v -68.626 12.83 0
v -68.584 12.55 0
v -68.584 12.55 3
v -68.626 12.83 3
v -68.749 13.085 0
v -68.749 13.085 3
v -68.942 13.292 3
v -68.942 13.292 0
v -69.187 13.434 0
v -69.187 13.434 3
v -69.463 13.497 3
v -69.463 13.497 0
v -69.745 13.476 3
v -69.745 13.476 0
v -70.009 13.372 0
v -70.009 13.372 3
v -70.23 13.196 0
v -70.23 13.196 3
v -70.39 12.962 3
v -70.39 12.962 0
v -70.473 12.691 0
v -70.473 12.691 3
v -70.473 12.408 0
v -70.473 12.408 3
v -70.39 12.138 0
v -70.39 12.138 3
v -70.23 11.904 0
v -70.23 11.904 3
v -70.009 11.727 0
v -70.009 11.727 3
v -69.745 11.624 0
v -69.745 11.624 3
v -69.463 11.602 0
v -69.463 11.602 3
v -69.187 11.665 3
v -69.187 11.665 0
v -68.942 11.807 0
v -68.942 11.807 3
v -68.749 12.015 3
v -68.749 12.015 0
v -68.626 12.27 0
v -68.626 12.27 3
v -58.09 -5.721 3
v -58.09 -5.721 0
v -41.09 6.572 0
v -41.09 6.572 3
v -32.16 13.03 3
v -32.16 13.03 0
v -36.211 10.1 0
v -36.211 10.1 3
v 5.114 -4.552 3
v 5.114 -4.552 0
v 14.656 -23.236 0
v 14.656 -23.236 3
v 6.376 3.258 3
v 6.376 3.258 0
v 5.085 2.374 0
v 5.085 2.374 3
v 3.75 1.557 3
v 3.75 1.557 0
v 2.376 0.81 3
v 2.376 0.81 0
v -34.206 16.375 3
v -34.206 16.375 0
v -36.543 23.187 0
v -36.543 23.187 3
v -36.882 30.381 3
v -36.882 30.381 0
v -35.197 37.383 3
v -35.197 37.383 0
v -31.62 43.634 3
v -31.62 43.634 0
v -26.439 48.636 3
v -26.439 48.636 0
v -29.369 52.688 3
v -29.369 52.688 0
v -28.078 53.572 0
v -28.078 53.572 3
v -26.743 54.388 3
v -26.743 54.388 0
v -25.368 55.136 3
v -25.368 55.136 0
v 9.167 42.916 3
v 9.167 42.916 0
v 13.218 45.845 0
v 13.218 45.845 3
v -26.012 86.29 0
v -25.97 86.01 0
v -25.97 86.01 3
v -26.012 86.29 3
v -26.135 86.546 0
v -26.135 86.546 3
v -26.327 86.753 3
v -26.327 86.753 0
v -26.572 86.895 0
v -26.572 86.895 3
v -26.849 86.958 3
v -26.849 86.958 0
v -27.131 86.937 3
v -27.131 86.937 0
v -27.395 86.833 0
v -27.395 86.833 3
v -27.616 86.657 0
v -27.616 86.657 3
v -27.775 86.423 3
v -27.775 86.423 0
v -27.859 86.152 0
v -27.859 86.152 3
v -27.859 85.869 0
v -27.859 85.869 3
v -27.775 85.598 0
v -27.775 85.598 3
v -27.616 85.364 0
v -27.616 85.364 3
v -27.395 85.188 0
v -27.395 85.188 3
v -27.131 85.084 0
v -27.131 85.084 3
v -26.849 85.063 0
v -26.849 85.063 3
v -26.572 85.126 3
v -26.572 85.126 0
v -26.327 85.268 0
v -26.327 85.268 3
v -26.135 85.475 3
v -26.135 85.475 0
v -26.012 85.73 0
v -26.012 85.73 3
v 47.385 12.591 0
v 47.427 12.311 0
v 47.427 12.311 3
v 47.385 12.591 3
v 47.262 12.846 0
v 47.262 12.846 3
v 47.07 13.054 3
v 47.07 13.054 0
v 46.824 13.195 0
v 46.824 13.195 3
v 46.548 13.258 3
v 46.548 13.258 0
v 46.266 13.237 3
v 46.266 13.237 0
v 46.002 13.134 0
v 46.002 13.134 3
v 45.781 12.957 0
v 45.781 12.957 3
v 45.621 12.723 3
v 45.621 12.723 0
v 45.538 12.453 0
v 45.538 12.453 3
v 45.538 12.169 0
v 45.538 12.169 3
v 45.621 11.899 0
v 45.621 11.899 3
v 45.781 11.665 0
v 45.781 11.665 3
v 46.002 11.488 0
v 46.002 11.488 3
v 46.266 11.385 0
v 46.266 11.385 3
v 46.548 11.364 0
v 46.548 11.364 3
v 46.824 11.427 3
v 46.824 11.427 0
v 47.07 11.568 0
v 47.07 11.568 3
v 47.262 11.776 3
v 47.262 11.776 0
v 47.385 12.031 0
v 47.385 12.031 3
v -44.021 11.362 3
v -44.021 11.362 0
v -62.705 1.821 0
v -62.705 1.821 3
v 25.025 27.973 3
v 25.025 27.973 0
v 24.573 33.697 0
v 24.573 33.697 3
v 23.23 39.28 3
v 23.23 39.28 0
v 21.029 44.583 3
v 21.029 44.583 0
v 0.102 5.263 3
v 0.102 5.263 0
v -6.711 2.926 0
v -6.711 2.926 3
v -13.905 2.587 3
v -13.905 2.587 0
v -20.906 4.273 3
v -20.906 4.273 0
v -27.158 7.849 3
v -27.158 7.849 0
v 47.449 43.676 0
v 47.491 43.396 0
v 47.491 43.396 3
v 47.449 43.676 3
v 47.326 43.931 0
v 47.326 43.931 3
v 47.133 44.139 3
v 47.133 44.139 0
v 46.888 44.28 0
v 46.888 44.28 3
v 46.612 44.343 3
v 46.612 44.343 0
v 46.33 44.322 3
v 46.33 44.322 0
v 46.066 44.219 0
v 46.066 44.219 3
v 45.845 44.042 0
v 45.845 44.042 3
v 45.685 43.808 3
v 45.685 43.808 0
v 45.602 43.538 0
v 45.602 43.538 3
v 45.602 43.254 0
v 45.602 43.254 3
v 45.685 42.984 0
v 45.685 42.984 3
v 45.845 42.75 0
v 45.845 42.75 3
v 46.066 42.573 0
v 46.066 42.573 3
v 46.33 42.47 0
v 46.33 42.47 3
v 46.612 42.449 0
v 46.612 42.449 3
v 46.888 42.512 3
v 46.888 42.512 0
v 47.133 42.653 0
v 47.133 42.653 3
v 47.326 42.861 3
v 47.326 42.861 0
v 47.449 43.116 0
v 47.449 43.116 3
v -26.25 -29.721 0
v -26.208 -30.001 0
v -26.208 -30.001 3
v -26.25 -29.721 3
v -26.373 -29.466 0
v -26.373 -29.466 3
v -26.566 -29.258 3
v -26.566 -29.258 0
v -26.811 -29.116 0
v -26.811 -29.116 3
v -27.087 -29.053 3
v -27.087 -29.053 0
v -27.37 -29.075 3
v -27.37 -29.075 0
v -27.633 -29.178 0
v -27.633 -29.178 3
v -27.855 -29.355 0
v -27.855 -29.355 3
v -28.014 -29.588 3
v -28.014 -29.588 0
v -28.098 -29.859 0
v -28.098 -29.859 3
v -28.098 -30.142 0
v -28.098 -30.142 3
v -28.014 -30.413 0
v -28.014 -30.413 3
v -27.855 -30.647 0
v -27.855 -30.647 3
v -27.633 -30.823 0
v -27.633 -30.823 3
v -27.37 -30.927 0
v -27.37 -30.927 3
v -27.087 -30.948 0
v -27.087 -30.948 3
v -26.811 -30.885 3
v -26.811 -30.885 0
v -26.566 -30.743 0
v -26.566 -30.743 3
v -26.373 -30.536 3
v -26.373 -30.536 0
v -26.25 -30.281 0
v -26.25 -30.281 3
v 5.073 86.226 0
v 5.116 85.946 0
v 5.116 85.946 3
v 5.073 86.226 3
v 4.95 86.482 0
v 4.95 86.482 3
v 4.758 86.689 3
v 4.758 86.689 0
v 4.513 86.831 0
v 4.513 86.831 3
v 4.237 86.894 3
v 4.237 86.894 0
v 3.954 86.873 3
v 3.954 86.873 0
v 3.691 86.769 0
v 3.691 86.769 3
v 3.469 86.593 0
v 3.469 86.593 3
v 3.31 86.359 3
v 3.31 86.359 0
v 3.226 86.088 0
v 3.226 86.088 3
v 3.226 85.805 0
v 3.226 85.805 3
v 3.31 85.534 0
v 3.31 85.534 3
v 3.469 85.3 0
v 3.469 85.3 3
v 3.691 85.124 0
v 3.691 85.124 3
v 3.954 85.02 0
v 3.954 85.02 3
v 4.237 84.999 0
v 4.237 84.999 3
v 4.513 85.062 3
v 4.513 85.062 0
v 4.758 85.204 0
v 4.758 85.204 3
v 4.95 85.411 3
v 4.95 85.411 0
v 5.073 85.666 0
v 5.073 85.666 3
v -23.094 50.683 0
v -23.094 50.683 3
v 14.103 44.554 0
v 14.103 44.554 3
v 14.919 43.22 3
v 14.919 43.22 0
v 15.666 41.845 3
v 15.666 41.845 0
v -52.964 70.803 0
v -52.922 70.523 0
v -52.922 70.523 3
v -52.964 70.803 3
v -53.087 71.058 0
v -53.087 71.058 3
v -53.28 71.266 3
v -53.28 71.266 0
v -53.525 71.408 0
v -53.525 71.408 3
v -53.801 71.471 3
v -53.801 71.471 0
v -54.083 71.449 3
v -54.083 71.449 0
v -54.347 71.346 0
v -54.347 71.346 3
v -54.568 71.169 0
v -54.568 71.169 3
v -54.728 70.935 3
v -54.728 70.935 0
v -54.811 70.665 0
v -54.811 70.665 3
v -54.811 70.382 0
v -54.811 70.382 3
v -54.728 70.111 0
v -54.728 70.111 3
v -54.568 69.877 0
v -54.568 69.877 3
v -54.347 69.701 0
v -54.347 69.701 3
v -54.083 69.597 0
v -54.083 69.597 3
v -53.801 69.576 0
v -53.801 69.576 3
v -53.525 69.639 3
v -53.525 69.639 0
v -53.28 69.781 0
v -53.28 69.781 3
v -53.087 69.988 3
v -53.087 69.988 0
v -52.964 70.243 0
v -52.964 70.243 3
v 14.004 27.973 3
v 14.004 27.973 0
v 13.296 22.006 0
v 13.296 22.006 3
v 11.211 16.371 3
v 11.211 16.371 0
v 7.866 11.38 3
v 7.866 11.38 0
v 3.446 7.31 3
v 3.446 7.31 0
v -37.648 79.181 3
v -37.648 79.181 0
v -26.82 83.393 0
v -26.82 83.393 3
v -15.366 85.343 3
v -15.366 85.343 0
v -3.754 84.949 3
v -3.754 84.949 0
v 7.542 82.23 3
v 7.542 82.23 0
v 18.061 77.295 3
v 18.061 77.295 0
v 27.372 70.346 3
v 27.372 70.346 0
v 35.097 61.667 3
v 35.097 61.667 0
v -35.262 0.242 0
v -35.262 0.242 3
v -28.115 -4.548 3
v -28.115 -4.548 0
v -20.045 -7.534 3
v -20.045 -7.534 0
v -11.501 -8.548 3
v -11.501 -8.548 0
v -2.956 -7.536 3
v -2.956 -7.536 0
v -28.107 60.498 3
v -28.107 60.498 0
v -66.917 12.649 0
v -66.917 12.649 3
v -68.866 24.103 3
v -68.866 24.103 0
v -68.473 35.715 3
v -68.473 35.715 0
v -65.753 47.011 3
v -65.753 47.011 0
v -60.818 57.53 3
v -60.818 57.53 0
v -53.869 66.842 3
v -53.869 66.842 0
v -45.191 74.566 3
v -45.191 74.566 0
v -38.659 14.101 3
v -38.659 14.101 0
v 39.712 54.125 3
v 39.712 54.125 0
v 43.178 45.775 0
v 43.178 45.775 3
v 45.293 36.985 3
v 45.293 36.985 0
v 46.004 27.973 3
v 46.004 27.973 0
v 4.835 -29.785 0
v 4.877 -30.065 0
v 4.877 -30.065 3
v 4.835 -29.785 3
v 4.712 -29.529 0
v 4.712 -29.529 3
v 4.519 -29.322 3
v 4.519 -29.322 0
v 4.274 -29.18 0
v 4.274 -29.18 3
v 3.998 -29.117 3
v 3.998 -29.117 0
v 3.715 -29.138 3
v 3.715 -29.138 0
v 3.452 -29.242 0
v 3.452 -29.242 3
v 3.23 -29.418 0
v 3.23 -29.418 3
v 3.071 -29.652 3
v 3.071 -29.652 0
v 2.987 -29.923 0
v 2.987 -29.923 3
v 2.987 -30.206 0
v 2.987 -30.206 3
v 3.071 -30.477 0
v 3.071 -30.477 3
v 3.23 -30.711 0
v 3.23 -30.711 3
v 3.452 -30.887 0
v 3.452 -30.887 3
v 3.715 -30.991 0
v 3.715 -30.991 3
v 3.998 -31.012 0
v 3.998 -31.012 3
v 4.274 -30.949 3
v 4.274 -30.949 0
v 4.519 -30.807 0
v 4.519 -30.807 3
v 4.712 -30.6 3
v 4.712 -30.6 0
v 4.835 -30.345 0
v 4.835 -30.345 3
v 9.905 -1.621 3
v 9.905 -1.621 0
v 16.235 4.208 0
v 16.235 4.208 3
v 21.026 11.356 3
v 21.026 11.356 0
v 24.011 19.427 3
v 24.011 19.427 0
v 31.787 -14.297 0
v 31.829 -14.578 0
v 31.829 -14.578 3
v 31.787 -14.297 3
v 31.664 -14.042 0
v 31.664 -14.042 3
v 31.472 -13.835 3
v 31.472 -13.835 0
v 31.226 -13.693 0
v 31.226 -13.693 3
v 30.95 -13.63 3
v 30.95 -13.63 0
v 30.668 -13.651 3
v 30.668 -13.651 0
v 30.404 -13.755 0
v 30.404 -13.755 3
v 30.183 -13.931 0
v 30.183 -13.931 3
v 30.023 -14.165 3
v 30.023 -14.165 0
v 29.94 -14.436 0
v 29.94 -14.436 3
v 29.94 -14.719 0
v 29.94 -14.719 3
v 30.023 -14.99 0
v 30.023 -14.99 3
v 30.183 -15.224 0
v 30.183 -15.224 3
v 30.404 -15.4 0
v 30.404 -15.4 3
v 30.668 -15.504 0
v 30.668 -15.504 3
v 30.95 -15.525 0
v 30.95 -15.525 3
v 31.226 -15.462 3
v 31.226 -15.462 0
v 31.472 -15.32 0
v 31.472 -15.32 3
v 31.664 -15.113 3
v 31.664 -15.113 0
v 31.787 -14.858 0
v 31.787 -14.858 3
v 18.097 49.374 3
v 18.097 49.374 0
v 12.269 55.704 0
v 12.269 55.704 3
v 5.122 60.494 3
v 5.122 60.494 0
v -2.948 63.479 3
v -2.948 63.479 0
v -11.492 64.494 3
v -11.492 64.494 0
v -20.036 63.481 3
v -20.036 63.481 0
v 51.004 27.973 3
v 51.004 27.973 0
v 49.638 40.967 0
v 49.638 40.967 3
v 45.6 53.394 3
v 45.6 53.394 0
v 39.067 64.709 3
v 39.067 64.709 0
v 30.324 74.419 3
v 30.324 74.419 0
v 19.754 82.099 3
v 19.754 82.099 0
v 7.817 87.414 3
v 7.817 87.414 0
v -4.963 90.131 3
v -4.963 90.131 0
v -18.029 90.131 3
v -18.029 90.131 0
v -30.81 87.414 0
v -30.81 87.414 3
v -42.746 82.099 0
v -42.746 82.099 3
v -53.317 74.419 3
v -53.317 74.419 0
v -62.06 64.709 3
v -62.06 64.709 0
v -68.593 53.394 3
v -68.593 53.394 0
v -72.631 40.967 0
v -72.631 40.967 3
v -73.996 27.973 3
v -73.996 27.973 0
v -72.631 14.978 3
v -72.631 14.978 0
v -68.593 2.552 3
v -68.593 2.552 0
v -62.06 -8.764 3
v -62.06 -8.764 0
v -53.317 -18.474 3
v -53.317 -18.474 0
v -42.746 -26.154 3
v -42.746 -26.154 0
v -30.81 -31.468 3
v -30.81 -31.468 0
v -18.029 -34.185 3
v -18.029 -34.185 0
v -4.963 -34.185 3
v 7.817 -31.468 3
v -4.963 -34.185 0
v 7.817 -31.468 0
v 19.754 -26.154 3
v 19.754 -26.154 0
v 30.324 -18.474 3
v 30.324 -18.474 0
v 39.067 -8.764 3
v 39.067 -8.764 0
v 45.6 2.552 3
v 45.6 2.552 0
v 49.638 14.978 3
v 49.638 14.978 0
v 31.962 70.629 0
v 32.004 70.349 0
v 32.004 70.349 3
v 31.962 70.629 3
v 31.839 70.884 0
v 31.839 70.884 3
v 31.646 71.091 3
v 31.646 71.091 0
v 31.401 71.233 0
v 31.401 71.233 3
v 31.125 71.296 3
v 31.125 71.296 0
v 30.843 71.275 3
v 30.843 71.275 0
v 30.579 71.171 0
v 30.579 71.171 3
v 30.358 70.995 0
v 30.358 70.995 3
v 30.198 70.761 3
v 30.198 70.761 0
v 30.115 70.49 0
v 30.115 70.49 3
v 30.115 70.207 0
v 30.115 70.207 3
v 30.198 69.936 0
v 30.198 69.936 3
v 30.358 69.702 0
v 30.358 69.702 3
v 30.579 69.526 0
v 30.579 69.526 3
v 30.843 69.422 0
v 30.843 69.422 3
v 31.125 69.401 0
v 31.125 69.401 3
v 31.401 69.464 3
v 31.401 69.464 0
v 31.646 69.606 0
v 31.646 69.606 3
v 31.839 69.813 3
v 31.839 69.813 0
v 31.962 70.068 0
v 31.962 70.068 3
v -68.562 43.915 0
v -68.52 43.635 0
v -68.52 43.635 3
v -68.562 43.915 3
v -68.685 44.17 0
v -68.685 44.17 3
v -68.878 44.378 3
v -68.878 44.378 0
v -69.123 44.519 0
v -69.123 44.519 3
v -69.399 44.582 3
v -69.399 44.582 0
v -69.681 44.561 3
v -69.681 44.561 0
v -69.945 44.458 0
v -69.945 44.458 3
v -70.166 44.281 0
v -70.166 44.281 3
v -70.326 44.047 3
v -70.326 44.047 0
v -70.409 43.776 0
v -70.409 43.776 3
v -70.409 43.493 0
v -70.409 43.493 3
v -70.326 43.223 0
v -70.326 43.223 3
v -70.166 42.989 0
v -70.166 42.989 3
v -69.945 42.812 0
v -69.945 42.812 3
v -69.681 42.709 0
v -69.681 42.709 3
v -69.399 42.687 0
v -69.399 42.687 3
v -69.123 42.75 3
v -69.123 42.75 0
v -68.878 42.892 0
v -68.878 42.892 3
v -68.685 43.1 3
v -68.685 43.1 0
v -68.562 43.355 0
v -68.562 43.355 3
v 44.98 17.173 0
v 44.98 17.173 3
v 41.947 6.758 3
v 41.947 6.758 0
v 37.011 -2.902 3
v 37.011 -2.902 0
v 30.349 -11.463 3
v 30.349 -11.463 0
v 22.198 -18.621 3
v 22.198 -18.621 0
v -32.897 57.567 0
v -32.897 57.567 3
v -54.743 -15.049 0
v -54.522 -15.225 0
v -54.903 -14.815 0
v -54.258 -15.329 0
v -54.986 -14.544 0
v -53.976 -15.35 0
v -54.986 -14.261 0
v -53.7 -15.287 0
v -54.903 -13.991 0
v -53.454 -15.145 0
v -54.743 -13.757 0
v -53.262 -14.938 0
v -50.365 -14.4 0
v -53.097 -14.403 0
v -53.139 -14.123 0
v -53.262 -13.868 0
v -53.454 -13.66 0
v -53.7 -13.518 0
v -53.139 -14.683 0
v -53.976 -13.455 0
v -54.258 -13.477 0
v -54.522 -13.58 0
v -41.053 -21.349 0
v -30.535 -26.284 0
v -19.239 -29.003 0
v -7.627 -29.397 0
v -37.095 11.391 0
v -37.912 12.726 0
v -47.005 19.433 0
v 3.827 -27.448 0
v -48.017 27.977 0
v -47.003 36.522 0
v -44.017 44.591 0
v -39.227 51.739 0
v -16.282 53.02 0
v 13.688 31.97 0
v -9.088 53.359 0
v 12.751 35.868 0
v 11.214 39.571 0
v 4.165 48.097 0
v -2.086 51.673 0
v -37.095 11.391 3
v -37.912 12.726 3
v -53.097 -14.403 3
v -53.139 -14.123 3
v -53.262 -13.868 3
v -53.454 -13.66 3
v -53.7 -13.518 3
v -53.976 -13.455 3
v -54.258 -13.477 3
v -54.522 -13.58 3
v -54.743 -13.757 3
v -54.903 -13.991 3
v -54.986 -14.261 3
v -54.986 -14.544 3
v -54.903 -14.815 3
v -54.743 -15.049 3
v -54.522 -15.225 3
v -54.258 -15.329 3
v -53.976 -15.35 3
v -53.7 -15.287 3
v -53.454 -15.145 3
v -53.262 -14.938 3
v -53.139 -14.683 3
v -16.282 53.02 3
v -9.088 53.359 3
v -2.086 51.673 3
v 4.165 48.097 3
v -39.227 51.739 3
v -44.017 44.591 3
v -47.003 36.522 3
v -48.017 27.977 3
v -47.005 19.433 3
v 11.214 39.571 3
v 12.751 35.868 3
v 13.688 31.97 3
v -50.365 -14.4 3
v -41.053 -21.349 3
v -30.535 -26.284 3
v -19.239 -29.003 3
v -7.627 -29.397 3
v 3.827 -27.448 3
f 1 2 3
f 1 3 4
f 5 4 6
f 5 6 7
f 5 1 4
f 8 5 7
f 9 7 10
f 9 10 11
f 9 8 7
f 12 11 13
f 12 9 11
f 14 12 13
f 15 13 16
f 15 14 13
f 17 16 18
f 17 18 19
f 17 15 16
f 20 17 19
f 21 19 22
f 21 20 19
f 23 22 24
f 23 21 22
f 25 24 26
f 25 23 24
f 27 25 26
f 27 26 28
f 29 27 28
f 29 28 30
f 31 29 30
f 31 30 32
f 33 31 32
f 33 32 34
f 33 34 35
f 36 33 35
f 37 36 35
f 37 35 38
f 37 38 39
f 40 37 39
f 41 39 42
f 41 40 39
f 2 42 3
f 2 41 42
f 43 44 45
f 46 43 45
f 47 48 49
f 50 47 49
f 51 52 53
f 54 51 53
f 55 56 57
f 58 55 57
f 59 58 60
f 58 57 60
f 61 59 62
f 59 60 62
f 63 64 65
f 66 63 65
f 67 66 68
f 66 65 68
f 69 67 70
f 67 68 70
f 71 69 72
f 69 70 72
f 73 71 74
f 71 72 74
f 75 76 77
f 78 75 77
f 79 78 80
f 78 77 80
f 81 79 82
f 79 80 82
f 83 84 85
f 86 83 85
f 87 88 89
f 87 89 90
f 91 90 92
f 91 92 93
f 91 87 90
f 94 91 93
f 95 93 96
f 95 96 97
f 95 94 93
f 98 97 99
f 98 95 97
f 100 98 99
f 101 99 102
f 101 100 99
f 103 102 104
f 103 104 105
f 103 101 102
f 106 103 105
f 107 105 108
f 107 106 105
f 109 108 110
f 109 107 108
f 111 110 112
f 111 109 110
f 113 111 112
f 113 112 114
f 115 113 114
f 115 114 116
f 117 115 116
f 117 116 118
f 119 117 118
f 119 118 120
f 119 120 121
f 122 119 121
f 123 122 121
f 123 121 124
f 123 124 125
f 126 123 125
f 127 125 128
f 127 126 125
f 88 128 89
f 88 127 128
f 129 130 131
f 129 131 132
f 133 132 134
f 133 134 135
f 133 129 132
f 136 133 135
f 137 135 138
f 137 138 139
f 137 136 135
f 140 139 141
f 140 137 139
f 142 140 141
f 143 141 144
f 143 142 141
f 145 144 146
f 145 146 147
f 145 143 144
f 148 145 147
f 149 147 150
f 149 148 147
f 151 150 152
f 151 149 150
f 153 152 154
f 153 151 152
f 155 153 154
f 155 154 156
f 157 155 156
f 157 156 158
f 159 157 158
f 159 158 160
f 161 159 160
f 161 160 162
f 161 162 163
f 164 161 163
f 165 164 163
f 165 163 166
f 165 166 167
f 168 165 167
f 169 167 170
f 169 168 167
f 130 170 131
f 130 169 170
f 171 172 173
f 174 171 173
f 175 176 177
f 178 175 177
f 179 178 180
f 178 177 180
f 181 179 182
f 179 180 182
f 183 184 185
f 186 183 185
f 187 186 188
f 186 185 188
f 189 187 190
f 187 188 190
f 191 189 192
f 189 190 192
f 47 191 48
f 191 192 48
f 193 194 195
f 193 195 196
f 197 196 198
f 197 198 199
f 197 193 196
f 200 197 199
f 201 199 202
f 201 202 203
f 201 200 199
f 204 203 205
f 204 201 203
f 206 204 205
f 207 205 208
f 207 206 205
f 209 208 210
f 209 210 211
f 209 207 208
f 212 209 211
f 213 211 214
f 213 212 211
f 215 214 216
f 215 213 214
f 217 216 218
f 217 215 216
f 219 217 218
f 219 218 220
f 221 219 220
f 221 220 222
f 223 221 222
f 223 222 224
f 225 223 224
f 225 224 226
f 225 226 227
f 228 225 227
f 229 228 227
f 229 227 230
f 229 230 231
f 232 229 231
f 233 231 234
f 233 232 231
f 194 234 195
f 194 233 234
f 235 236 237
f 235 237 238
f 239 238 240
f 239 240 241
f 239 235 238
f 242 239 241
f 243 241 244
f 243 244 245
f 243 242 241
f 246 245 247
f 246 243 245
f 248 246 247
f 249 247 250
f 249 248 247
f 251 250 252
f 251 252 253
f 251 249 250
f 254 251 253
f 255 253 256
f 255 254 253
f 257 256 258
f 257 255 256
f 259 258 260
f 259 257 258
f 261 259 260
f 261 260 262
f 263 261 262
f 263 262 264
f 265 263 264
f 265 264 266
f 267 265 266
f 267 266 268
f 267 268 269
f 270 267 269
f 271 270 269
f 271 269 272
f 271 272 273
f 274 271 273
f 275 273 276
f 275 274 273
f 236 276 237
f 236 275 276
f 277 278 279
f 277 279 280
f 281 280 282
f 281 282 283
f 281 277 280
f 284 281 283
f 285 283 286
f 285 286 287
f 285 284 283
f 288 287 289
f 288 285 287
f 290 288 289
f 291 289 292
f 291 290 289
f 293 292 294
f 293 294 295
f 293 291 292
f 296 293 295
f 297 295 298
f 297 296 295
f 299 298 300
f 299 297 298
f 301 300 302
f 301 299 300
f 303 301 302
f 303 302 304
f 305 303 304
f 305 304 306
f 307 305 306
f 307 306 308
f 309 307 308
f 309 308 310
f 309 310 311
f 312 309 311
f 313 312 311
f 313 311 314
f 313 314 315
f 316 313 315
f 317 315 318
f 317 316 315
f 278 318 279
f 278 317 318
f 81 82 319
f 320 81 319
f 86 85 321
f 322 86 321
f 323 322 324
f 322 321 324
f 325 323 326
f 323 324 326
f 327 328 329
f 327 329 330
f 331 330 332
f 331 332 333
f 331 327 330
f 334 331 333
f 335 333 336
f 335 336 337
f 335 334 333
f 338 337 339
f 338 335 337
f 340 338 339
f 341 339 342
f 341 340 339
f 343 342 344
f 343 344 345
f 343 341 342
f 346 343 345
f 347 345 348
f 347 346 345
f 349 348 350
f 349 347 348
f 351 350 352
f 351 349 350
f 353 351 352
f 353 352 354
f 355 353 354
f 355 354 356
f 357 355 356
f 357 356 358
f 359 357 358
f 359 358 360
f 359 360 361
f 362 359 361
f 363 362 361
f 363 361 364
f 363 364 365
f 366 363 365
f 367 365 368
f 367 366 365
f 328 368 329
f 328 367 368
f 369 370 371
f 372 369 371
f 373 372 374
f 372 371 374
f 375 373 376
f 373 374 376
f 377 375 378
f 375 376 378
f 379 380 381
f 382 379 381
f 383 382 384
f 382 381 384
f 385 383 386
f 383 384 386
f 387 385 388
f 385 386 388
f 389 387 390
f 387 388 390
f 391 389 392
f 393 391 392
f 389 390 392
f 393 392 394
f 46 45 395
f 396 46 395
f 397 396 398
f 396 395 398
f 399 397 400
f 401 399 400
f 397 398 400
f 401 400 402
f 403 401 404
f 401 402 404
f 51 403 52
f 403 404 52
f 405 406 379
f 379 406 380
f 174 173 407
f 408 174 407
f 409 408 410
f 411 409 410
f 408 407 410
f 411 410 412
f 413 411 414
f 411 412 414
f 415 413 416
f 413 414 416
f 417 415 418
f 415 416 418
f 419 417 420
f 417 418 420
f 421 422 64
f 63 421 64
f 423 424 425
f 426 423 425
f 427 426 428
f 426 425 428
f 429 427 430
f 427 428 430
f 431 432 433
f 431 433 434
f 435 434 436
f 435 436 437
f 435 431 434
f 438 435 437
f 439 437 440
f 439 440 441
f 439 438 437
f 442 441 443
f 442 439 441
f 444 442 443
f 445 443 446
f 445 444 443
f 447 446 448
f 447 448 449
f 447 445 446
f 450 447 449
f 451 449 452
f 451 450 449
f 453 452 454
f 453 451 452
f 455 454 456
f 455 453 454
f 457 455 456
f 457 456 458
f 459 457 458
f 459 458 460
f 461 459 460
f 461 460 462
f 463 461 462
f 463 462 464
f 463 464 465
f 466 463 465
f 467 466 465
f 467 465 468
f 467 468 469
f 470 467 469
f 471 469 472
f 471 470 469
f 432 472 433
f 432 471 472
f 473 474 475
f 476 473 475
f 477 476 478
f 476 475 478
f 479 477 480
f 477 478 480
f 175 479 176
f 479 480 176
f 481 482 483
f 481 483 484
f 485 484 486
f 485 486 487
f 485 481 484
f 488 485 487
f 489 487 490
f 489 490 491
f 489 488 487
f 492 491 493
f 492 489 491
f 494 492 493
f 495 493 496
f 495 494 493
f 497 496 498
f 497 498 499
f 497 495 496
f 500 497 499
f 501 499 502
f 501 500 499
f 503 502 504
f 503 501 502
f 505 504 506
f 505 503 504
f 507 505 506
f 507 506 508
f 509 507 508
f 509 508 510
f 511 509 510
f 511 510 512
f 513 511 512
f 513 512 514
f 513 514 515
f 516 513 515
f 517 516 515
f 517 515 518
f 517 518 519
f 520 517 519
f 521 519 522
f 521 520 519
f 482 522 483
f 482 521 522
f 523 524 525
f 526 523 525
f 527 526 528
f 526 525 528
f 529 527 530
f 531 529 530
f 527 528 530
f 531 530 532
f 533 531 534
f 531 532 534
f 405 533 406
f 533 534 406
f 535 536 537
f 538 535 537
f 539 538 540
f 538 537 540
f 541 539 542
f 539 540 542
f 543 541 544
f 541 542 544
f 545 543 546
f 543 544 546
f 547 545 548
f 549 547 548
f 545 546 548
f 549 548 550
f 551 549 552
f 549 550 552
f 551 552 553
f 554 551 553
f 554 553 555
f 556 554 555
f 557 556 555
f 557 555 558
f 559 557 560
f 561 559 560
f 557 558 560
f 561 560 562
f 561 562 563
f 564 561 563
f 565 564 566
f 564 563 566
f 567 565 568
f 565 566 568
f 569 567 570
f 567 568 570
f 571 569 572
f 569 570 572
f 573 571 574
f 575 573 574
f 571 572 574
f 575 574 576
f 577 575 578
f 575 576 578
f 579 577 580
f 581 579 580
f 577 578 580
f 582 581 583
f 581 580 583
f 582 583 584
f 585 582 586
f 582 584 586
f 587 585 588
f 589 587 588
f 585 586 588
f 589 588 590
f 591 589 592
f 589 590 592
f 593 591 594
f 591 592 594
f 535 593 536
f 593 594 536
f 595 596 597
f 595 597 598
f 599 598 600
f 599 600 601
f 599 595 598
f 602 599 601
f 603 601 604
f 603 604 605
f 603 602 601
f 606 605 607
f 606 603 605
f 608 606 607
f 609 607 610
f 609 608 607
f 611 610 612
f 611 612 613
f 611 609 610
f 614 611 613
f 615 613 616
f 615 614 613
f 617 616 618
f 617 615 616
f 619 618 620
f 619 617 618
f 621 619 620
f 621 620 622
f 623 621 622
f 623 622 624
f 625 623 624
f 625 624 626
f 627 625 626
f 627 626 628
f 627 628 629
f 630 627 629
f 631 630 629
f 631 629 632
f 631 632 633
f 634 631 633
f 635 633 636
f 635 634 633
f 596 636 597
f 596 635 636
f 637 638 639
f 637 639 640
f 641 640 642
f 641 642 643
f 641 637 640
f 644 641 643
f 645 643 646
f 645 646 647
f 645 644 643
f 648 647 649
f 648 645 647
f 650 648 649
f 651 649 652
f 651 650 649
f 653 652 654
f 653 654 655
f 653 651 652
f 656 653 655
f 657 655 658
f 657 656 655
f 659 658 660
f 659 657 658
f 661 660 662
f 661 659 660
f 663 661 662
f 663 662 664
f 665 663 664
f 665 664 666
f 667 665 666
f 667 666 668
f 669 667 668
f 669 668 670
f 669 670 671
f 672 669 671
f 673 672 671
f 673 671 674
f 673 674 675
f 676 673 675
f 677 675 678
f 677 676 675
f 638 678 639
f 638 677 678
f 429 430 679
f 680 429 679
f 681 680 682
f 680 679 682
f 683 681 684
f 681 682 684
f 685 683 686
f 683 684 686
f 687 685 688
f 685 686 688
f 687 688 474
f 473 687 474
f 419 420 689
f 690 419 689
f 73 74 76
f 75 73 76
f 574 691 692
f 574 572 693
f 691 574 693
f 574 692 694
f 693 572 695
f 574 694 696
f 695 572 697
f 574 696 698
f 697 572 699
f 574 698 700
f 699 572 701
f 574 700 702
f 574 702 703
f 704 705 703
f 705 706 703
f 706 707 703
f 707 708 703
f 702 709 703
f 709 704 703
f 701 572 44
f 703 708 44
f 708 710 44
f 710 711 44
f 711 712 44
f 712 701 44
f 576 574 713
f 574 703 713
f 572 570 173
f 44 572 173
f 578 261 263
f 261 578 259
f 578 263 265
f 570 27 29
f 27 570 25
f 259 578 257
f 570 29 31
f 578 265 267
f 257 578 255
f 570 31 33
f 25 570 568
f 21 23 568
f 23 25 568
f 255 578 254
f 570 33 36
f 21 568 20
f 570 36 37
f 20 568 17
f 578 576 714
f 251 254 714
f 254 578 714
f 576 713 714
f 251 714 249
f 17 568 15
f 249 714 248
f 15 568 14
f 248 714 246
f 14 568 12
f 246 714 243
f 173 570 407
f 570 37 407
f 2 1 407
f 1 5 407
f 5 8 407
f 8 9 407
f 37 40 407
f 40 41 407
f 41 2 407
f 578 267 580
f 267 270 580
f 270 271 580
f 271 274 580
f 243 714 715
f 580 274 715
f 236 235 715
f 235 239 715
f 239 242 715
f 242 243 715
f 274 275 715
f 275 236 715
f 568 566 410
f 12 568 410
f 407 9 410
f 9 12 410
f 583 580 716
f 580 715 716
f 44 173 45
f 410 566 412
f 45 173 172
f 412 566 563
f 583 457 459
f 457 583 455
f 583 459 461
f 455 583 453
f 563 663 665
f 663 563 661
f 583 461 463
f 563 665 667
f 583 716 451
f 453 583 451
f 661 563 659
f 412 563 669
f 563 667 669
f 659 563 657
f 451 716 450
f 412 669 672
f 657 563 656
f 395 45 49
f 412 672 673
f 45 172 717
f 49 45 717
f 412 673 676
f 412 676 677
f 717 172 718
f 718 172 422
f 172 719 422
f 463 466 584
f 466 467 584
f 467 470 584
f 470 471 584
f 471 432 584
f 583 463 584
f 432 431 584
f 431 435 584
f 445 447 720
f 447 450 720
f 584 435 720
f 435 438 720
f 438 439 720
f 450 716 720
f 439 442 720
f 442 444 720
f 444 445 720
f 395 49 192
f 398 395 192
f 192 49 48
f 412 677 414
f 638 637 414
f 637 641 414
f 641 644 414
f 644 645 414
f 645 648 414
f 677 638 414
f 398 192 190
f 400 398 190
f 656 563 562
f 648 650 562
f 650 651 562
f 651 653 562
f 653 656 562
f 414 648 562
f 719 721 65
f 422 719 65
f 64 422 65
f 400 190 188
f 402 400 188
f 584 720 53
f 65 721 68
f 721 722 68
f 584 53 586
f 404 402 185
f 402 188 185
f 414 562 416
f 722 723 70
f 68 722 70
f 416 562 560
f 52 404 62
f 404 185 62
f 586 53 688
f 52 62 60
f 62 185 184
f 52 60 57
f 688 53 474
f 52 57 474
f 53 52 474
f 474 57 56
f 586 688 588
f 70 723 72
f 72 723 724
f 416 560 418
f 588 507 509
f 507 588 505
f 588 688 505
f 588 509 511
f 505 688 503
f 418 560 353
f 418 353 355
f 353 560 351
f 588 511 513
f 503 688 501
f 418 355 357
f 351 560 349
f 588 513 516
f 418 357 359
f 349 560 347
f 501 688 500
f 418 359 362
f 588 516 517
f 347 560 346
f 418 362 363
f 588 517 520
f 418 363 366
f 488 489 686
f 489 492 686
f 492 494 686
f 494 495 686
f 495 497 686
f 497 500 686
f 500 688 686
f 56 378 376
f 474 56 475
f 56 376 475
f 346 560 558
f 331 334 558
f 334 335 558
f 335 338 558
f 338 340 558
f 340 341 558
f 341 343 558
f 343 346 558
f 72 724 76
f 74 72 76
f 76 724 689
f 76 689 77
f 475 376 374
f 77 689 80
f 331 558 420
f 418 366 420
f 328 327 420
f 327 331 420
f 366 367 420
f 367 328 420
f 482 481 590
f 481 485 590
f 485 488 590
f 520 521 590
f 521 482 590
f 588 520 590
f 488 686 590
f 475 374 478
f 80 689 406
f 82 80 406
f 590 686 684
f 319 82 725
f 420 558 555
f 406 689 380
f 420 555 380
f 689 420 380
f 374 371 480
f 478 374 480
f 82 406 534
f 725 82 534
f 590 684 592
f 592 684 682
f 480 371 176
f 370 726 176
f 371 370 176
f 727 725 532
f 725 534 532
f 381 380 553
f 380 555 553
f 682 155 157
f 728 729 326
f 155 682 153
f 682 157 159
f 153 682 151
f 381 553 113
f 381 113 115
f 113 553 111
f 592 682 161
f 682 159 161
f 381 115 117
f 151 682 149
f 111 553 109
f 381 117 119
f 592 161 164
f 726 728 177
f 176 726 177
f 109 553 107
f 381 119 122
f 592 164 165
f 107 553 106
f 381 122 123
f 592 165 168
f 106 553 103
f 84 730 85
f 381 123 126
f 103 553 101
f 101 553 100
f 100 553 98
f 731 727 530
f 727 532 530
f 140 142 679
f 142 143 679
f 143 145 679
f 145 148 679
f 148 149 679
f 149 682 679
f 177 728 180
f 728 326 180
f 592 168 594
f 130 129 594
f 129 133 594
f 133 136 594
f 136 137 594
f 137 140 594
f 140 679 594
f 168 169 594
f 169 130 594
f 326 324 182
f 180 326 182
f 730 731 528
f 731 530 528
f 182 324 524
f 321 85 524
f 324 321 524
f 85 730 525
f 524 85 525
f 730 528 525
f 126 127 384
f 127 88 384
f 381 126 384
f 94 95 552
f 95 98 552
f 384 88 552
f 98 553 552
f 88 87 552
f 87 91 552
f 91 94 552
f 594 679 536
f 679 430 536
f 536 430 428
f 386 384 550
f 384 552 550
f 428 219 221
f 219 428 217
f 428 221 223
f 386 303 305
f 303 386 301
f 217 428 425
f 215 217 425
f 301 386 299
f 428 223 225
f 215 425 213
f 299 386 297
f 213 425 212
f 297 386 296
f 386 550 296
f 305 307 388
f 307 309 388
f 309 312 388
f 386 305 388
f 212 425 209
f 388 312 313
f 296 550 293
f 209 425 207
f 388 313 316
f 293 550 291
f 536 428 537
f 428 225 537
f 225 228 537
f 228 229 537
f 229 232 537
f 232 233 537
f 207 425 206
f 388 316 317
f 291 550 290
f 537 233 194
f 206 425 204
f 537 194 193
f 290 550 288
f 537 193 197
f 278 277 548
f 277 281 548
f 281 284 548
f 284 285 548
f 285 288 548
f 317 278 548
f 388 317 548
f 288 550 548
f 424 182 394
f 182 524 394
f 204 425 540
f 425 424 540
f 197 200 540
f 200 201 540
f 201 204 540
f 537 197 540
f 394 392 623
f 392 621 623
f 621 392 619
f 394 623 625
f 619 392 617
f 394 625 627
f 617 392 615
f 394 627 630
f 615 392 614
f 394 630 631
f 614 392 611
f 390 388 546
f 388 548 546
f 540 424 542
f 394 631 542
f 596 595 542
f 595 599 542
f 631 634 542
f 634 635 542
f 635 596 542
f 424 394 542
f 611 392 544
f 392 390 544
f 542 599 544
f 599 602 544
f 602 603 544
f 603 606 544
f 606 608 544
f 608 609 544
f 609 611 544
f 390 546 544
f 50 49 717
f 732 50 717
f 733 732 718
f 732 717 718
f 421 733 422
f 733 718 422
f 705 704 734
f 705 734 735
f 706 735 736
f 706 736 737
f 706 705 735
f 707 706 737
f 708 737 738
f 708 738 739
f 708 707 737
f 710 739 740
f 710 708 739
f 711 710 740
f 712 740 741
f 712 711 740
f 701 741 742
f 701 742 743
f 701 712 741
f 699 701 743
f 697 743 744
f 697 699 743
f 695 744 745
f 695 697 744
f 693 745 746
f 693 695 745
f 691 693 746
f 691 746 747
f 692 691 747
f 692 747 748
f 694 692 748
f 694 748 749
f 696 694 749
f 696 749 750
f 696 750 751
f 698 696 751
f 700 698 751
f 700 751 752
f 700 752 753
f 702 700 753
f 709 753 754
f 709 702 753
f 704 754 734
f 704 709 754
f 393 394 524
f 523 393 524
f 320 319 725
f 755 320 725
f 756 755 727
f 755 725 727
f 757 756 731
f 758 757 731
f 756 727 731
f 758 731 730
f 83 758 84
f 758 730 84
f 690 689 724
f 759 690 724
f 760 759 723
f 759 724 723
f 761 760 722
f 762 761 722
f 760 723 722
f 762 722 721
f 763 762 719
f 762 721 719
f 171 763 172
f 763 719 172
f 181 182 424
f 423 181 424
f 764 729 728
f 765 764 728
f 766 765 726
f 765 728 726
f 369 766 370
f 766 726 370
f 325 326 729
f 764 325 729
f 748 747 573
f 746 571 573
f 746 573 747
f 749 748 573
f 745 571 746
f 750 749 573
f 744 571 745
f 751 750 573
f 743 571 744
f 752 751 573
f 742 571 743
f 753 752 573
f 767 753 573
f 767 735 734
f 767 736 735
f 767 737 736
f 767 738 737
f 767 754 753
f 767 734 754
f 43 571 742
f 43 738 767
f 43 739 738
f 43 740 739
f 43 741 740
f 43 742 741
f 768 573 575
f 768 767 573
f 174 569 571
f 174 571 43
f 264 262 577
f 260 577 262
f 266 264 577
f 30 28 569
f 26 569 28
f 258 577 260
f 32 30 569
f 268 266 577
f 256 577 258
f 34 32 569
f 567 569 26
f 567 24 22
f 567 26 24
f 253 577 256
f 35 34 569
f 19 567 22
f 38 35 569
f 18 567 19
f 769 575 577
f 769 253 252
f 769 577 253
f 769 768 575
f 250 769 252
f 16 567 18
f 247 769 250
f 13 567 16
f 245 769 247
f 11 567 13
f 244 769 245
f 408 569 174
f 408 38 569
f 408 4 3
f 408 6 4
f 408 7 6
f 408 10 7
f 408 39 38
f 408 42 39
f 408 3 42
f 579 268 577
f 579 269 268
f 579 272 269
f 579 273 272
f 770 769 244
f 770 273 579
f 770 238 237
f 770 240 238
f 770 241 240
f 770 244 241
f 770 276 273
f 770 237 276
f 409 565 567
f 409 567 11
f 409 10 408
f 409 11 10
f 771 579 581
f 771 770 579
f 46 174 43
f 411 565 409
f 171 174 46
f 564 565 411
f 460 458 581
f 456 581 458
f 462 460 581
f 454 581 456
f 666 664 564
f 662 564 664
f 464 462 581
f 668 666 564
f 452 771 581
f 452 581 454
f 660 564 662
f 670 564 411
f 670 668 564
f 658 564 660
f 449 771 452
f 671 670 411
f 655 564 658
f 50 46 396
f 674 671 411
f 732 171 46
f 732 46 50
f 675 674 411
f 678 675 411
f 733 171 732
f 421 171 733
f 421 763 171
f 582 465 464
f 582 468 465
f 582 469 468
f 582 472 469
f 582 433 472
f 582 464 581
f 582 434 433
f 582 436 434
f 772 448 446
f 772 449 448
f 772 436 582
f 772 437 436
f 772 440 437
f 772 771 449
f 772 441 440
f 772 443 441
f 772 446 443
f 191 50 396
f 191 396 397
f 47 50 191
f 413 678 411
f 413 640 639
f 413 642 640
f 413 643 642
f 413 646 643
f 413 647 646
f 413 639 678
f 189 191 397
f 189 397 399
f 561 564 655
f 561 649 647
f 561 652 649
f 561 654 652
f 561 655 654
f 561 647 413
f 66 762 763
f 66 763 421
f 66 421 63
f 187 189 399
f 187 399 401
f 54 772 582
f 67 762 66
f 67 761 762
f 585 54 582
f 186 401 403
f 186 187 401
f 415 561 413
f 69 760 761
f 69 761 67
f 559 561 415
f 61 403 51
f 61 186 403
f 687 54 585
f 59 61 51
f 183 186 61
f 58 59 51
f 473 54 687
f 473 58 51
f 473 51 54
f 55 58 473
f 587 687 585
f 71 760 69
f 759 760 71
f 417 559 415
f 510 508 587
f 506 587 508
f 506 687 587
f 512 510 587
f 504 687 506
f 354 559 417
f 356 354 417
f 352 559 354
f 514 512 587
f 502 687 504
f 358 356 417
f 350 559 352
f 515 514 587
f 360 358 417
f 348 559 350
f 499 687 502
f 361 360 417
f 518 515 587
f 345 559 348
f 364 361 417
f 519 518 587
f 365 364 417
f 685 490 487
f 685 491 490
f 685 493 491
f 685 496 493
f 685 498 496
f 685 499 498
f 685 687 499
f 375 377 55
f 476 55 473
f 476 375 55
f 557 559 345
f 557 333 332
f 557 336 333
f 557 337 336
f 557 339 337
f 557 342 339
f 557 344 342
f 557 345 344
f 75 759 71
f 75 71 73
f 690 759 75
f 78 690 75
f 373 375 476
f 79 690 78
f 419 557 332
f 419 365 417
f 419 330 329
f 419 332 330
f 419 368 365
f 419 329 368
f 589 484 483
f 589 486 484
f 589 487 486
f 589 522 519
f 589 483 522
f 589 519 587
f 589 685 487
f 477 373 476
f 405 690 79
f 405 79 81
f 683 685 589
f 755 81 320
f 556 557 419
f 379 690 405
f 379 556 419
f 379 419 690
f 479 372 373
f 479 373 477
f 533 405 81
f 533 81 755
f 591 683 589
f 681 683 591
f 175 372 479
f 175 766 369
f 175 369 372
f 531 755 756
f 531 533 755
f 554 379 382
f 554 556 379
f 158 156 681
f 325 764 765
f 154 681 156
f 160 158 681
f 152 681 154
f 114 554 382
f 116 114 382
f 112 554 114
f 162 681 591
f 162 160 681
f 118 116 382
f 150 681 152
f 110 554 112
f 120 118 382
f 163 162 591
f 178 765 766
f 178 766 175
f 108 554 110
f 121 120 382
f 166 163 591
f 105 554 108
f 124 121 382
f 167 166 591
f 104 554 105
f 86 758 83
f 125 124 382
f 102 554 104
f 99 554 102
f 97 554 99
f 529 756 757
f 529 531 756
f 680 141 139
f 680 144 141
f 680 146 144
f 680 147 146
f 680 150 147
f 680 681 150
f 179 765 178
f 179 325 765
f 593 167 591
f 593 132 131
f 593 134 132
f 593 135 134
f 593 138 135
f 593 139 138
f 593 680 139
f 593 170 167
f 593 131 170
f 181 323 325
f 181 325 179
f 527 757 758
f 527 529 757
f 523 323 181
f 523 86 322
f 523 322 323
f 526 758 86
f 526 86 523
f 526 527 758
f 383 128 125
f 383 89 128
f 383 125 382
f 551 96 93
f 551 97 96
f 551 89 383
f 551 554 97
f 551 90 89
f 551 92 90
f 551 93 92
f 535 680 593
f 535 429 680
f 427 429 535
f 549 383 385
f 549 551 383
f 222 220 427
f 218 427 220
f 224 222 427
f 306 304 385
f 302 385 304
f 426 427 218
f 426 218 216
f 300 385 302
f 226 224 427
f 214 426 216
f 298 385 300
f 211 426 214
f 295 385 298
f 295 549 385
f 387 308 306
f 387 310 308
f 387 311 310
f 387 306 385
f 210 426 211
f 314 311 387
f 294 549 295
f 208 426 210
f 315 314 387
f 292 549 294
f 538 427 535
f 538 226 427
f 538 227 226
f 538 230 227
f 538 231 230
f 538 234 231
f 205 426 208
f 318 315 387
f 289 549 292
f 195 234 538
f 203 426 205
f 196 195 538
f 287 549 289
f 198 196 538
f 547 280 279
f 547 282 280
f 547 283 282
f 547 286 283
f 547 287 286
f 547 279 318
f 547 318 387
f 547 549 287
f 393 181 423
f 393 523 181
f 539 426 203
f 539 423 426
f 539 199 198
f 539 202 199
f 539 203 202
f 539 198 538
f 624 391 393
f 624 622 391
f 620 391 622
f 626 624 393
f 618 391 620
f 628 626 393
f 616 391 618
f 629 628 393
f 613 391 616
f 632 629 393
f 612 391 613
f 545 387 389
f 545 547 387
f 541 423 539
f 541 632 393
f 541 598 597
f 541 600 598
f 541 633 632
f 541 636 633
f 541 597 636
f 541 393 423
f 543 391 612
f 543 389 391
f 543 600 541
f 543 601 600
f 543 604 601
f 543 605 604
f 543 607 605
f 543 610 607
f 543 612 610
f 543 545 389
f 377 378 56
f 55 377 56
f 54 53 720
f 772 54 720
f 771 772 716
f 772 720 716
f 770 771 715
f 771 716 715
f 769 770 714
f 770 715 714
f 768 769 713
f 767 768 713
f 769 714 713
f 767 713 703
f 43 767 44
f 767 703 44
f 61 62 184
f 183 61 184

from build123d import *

# Parameters (mm, degrees)
F0_R     = 62.5
F0_R_2   = 0.95
F1_DEPTH = 3


with BuildPart() as f1:
    # F0 (on Top) → F1 (new body)
    with BuildSketch(Plane.XY):
        with Locations((-11.4963501692, 27.9728826135)):
            Circle(F0_R)
        with Locations((-54.0467362732, -14.4027499996)):
            Circle(F0_R_2, mode=Mode.SUBTRACT)
        with Locations((-27.1582491696, -30.0006847829)):
            Circle(F0_R_2, mode=Mode.SUBTRACT)
        with Locations((-69.5338817827, 12.5497013212)):
            Circle(F0_R_2, mode=Mode.SUBTRACT)
        with Locations((3.9268311232, -30.064649)):
            Circle(F0_R_2, mode=Mode.SUBTRACT)
        with Locations((30.8792824439, -14.5775034905)):
            Circle(F0_R_2, mode=Mode.SUBTRACT)
        with Locations((46.4772172272, 12.3109836131)):
            Circle(F0_R_2, mode=Mode.SUBTRACT)
        with Locations((-69.4699175656, 43.6347816139)):
            Circle(F0_R_2, mode=Mode.SUBTRACT)
        with Locations((-53.8719827823, 70.5232687176)):
            Circle(F0_R_2, mode=Mode.SUBTRACT)
        with Locations((-26.9195314615, 86.010414227)):
            Circle(F0_R_2, mode=Mode.SUBTRACT)
        with BuildLine():
            ThreePointArc((35.0970928529, 61.6671116053), (37.5498519583, 57.9848811619), (39.7122301293, 54.1249629097))
            ThreePointArc((39.7122301293, 54.1249629097), (44.4086736085, 41.4219835656), (46.0036498308, 27.9728826135))
            ThreePointArc((46.0036498308, 27.9728826135), (39.707498158, 1.8115386785), (22.1978788226, -18.6205604085))
            ThreePointArc((22.1978788226, -18.6205604085), (18.5156483792, -21.073319514), (14.655730127, -23.2356976849))
            ThreePointArc((14.655730127, -23.2356976849), (-24.9555645945, -27.9297071928), (-58.0897931912, -5.7213463782))
            ThreePointArc((-58.0897931912, -5.7213463782), (-60.5425522967, -2.0391159348), (-62.7049304676, 1.8208023173))
            ThreePointArc((-62.7049304676, 1.8208023173), (-67.3989399755, 41.4320970388), (-45.190579161, 74.5663256356))
            ThreePointArc((-45.190579161, 74.5663256356), (-41.5083487176, 77.019084741), (-37.6484304654, 79.181462912))
            ThreePointArc((-37.6484304654, 79.181462912), (1.9628642561, 83.8754724199), (35.0970928529, 61.6671116053))
        make_face(mode=Mode.SUBTRACT)
        with Locations((46.5411814443, 43.3960639059)):
            Circle(F0_R_2, mode=Mode.SUBTRACT)
        with Locations((4.1655488312, 85.9464500099)):
            Circle(F0_R_2, mode=Mode.SUBTRACT)
        with Locations((31.0540359349, 70.3485152266)):
            Circle(F0_R_2, mode=Mode.SUBTRACT)
        with BuildLine():
            ThreePointArc((-23.0942292571, 50.6827747459), (-5.5274811632, 52.764465919), (9.1668289102, 42.9155406882))
            Line((9.1668289102, 42.9155406882), (13.2184326512, 45.845473644))
            ThreePointArc((13.2184326512, 45.845473644), (-4.3571146914, 57.6255606847), (-25.3683231959, 55.1356947718))
            Line((-25.3683231959, 55.1356947718), (-23.0942292571, 50.6827747459))
        make_face()
        with BuildLine():
            ThreePointArc((-34.2062423015, 16.3750035257), (-36.2879334746, 33.9417516195), (-26.4390082438, 48.6360616929))
            Line((-26.4390082438, 48.6360616929), (-29.3689411996, 52.6876654339))
            ThreePointArc((-29.3689411996, 52.6876654339), (-41.1490282404, 35.1121180913), (-38.6591623275, 14.1009095869))
            Line((-38.6591623275, 14.1009095869), (-34.2062423015, 16.3750035257))
        make_face()
        with BuildLine():
            Line((2.3756228575, 0.8100704552), (0.1015289187, 5.2629904812))
            ThreePointArc((0.1015289187, 5.2629904812), (-17.4652191752, 3.1812993081), (-32.1595292485, 13.0302245389))
            Line((-32.1595292485, 13.0302245389), (-36.2111329896, 10.1002915831))
            ThreePointArc((-36.2111329896, 10.1002915831), (-18.6355856469, -1.6797954576), (2.3756228575, 0.8100704552))
        make_face()
        with BuildLine():
            ThreePointArc((11.2135419632, 39.5707617014), (13.2963125496, 33.937266514), (14.0036498308, 27.9728826135))
            ThreePointArc((14.0036498308, 27.9728826135), (11.2114434368, 16.3708953032), (3.4463079054, 7.3097035342))
            Line((3.4463079054, 7.3097035342), (6.3762408612, 3.2580997931))
            ThreePointArc((6.3762408612, 3.2580997931), (15.663951987, 14.0959958306), (19.0036498308, 27.9728826135))
            ThreePointArc((19.0036498308, 27.9728826135), (18.1576189651, 35.1067535534), (15.6664619891, 41.8448556402))
            Line((15.6664619891, 41.8448556402), (11.2135419632, 39.5707617014))
        make_face()
        with BuildLine():
            ThreePointArc((13.2184326512, 45.845473644), (14.5194613941, 43.8922905392), (15.6664619891, 41.8448556402))
            Line((15.6664619891, 41.8448556402), (21.0287945872, 44.5833840638))
            ThreePointArc((21.0287945872, 44.5833840638), (19.6553594594, 47.0350122708), (18.097488796, 49.3737820141))
            Line((18.097488796, 49.3737820141), (13.2184326512, 45.845473644))
        make_face()
        with BuildLine():
            ThreePointArc((-29.3689411996, 52.6876654339), (-27.4157580948, 53.9886941768), (-25.3683231959, 55.1356947718))
            Line((-25.3683231959, 55.1356947718), (-28.1068516195, 60.4980273699))
            ThreePointArc((-28.1068516195, 60.4980273699), (-30.5584798265, 59.1245922421), (-32.8972495697, 57.5667215788))
            Line((-32.8972495697, 57.5667215788), (-29.3689411996, 52.6876654339))
        make_face()
        with BuildLine():
            Line((9.9045492314, -1.6209563517), (6.3762408612, 3.2580997931))
            ThreePointArc((6.3762408612, 3.2580997931), (4.4230577565, 1.9570710503), (2.3756228575, 0.8100704552))
            Line((2.3756228575, 0.8100704552), (5.1141512811, -4.5522621428))
            ThreePointArc((5.1141512811, -4.5522621428), (7.5657794881, -3.178827015), (9.9045492314, -1.6209563517))
        make_face()
        with BuildLine():
            Line((-41.0901891344, 6.571983213), (-36.2111329896, 10.1002915831))
            ThreePointArc((-36.2111329896, 10.1002915831), (-37.5121617325, 12.0534746879), (-38.6591623275, 14.1009095869))
            Line((-38.6591623275, 14.1009095869), (-44.0214949255, 11.3623811633))
            ThreePointArc((-44.0214949255, 11.3623811633), (-42.6480597977, 8.9107529563), (-41.0901891344, 6.571983213))
        make_face()
        with BuildLine():
            Line((21.0287945872, 44.5833840638), (15.6664619891, 41.8448556402))
            ThreePointArc((15.6664619891, 41.8448556402), (18.1576189651, 35.1067535534), (19.0036498308, 27.9728826135))
            ThreePointArc((19.0036498308, 27.9728826135), (15.663951987, 14.0959958306), (6.3762408612, 3.2580997931))
            Line((6.3762408612, 3.2580997931), (9.9045492314, -1.6209563517))
            ThreePointArc((9.9045492314, -1.6209563517), (21.0257890743, 11.3564973604), (25.024791651, 27.9728826135))
            ThreePointArc((25.024791651, 27.9728826135), (24.0117420368, 36.5150830175), (21.0287945872, 44.5833840638))
        make_face()
        with BuildLine():
            Line((5.1141512811, -4.5522621428), (2.3756228575, 0.8100704552))
            ThreePointArc((2.3756228575, 0.8100704552), (-18.6355856469, -1.6797954576), (-36.2111329896, 10.1002915831))
            Line((-36.2111329896, 10.1002915831), (-41.0901891344, 6.571983213))
            ThreePointArc((-41.0901891344, 6.571983213), (-20.0449741486, -7.5336636549), (5.1141512811, -4.5522621428))
        make_face()
        with BuildLine():
            ThreePointArc((-38.6591623275, 14.1009095869), (-41.1490282404, 35.1121180913), (-29.3689411996, 52.6876654339))
            Line((-29.3689411996, 52.6876654339), (-32.8972495697, 57.5667215788))
            ThreePointArc((-32.8972495697, 57.5667215788), (-47.0028964376, 36.5215065929), (-44.0214949255, 11.3623811633))
            Line((-44.0214949255, 11.3623811633), (-38.6591623275, 14.1009095869))
        make_face()
        with BuildLine():
            ThreePointArc((-25.3683231959, 55.1356947718), (-4.3571146914, 57.6255606847), (13.2184326512, 45.845473644))
            Line((13.2184326512, 45.845473644), (18.097488796, 49.3737820141))
            ThreePointArc((18.097488796, 49.3737820141), (-2.9477261898, 63.479428882), (-28.1068516195, 60.4980273699))
            Line((-28.1068516195, 60.4980273699), (-25.3683231959, 55.1356947718))
        make_face()
        with BuildLine():
            Line((-58.0897931912, -5.7213463782), (-41.0901891344, 6.571983213))
            ThreePointArc((-41.0901891344, 6.571983213), (-42.6480597977, 8.9107529563), (-44.0214949255, 11.3623811633))
            Line((-44.0214949255, 11.3623811633), (-62.7049304676, 1.8208023173))
            ThreePointArc((-62.7049304676, 1.8208023173), (-60.5425522967, -2.0391159348), (-58.0897931912, -5.7213463782))
        make_face()
        with BuildLine():
            Line((22.1978788226, -18.6205604085), (9.9045492314, -1.6209563517))
            ThreePointArc((9.9045492314, -1.6209563517), (7.5657794881, -3.178827015), (5.1141512811, -4.5522621428))
            Line((5.1141512811, -4.5522621428), (14.655730127, -23.2356976849))
            ThreePointArc((14.655730127, -23.2356976849), (18.5156483792, -21.073319514), (22.1978788226, -18.6205604085))
        make_face()
        with BuildLine():
            ThreePointArc((18.097488796, 49.3737820141), (19.6553594594, 47.0350122708), (21.0287945872, 44.5833840638))
            Line((21.0287945872, 44.5833840638), (39.7122301293, 54.1249629097))
            ThreePointArc((39.7122301293, 54.1249629097), (37.5498519583, 57.9848811619), (35.0970928529, 61.6671116053))
            Line((35.0970928529, 61.6671116053), (18.097488796, 49.3737820141))
        make_face()
        with BuildLine():
            ThreePointArc((-32.8972495697, 57.5667215788), (-30.5584798265, 59.1245922421), (-28.1068516195, 60.4980273699))
            Line((-28.1068516195, 60.4980273699), (-37.6484304654, 79.181462912))
            ThreePointArc((-37.6484304654, 79.181462912), (-41.5083487176, 77.019084741), (-45.190579161, 74.5663256356))
            Line((-45.190579161, 74.5663256356), (-32.8972495697, 57.5667215788))
        make_face()
    extrude(amount=F1_DEPTH)


solid = f1.part
